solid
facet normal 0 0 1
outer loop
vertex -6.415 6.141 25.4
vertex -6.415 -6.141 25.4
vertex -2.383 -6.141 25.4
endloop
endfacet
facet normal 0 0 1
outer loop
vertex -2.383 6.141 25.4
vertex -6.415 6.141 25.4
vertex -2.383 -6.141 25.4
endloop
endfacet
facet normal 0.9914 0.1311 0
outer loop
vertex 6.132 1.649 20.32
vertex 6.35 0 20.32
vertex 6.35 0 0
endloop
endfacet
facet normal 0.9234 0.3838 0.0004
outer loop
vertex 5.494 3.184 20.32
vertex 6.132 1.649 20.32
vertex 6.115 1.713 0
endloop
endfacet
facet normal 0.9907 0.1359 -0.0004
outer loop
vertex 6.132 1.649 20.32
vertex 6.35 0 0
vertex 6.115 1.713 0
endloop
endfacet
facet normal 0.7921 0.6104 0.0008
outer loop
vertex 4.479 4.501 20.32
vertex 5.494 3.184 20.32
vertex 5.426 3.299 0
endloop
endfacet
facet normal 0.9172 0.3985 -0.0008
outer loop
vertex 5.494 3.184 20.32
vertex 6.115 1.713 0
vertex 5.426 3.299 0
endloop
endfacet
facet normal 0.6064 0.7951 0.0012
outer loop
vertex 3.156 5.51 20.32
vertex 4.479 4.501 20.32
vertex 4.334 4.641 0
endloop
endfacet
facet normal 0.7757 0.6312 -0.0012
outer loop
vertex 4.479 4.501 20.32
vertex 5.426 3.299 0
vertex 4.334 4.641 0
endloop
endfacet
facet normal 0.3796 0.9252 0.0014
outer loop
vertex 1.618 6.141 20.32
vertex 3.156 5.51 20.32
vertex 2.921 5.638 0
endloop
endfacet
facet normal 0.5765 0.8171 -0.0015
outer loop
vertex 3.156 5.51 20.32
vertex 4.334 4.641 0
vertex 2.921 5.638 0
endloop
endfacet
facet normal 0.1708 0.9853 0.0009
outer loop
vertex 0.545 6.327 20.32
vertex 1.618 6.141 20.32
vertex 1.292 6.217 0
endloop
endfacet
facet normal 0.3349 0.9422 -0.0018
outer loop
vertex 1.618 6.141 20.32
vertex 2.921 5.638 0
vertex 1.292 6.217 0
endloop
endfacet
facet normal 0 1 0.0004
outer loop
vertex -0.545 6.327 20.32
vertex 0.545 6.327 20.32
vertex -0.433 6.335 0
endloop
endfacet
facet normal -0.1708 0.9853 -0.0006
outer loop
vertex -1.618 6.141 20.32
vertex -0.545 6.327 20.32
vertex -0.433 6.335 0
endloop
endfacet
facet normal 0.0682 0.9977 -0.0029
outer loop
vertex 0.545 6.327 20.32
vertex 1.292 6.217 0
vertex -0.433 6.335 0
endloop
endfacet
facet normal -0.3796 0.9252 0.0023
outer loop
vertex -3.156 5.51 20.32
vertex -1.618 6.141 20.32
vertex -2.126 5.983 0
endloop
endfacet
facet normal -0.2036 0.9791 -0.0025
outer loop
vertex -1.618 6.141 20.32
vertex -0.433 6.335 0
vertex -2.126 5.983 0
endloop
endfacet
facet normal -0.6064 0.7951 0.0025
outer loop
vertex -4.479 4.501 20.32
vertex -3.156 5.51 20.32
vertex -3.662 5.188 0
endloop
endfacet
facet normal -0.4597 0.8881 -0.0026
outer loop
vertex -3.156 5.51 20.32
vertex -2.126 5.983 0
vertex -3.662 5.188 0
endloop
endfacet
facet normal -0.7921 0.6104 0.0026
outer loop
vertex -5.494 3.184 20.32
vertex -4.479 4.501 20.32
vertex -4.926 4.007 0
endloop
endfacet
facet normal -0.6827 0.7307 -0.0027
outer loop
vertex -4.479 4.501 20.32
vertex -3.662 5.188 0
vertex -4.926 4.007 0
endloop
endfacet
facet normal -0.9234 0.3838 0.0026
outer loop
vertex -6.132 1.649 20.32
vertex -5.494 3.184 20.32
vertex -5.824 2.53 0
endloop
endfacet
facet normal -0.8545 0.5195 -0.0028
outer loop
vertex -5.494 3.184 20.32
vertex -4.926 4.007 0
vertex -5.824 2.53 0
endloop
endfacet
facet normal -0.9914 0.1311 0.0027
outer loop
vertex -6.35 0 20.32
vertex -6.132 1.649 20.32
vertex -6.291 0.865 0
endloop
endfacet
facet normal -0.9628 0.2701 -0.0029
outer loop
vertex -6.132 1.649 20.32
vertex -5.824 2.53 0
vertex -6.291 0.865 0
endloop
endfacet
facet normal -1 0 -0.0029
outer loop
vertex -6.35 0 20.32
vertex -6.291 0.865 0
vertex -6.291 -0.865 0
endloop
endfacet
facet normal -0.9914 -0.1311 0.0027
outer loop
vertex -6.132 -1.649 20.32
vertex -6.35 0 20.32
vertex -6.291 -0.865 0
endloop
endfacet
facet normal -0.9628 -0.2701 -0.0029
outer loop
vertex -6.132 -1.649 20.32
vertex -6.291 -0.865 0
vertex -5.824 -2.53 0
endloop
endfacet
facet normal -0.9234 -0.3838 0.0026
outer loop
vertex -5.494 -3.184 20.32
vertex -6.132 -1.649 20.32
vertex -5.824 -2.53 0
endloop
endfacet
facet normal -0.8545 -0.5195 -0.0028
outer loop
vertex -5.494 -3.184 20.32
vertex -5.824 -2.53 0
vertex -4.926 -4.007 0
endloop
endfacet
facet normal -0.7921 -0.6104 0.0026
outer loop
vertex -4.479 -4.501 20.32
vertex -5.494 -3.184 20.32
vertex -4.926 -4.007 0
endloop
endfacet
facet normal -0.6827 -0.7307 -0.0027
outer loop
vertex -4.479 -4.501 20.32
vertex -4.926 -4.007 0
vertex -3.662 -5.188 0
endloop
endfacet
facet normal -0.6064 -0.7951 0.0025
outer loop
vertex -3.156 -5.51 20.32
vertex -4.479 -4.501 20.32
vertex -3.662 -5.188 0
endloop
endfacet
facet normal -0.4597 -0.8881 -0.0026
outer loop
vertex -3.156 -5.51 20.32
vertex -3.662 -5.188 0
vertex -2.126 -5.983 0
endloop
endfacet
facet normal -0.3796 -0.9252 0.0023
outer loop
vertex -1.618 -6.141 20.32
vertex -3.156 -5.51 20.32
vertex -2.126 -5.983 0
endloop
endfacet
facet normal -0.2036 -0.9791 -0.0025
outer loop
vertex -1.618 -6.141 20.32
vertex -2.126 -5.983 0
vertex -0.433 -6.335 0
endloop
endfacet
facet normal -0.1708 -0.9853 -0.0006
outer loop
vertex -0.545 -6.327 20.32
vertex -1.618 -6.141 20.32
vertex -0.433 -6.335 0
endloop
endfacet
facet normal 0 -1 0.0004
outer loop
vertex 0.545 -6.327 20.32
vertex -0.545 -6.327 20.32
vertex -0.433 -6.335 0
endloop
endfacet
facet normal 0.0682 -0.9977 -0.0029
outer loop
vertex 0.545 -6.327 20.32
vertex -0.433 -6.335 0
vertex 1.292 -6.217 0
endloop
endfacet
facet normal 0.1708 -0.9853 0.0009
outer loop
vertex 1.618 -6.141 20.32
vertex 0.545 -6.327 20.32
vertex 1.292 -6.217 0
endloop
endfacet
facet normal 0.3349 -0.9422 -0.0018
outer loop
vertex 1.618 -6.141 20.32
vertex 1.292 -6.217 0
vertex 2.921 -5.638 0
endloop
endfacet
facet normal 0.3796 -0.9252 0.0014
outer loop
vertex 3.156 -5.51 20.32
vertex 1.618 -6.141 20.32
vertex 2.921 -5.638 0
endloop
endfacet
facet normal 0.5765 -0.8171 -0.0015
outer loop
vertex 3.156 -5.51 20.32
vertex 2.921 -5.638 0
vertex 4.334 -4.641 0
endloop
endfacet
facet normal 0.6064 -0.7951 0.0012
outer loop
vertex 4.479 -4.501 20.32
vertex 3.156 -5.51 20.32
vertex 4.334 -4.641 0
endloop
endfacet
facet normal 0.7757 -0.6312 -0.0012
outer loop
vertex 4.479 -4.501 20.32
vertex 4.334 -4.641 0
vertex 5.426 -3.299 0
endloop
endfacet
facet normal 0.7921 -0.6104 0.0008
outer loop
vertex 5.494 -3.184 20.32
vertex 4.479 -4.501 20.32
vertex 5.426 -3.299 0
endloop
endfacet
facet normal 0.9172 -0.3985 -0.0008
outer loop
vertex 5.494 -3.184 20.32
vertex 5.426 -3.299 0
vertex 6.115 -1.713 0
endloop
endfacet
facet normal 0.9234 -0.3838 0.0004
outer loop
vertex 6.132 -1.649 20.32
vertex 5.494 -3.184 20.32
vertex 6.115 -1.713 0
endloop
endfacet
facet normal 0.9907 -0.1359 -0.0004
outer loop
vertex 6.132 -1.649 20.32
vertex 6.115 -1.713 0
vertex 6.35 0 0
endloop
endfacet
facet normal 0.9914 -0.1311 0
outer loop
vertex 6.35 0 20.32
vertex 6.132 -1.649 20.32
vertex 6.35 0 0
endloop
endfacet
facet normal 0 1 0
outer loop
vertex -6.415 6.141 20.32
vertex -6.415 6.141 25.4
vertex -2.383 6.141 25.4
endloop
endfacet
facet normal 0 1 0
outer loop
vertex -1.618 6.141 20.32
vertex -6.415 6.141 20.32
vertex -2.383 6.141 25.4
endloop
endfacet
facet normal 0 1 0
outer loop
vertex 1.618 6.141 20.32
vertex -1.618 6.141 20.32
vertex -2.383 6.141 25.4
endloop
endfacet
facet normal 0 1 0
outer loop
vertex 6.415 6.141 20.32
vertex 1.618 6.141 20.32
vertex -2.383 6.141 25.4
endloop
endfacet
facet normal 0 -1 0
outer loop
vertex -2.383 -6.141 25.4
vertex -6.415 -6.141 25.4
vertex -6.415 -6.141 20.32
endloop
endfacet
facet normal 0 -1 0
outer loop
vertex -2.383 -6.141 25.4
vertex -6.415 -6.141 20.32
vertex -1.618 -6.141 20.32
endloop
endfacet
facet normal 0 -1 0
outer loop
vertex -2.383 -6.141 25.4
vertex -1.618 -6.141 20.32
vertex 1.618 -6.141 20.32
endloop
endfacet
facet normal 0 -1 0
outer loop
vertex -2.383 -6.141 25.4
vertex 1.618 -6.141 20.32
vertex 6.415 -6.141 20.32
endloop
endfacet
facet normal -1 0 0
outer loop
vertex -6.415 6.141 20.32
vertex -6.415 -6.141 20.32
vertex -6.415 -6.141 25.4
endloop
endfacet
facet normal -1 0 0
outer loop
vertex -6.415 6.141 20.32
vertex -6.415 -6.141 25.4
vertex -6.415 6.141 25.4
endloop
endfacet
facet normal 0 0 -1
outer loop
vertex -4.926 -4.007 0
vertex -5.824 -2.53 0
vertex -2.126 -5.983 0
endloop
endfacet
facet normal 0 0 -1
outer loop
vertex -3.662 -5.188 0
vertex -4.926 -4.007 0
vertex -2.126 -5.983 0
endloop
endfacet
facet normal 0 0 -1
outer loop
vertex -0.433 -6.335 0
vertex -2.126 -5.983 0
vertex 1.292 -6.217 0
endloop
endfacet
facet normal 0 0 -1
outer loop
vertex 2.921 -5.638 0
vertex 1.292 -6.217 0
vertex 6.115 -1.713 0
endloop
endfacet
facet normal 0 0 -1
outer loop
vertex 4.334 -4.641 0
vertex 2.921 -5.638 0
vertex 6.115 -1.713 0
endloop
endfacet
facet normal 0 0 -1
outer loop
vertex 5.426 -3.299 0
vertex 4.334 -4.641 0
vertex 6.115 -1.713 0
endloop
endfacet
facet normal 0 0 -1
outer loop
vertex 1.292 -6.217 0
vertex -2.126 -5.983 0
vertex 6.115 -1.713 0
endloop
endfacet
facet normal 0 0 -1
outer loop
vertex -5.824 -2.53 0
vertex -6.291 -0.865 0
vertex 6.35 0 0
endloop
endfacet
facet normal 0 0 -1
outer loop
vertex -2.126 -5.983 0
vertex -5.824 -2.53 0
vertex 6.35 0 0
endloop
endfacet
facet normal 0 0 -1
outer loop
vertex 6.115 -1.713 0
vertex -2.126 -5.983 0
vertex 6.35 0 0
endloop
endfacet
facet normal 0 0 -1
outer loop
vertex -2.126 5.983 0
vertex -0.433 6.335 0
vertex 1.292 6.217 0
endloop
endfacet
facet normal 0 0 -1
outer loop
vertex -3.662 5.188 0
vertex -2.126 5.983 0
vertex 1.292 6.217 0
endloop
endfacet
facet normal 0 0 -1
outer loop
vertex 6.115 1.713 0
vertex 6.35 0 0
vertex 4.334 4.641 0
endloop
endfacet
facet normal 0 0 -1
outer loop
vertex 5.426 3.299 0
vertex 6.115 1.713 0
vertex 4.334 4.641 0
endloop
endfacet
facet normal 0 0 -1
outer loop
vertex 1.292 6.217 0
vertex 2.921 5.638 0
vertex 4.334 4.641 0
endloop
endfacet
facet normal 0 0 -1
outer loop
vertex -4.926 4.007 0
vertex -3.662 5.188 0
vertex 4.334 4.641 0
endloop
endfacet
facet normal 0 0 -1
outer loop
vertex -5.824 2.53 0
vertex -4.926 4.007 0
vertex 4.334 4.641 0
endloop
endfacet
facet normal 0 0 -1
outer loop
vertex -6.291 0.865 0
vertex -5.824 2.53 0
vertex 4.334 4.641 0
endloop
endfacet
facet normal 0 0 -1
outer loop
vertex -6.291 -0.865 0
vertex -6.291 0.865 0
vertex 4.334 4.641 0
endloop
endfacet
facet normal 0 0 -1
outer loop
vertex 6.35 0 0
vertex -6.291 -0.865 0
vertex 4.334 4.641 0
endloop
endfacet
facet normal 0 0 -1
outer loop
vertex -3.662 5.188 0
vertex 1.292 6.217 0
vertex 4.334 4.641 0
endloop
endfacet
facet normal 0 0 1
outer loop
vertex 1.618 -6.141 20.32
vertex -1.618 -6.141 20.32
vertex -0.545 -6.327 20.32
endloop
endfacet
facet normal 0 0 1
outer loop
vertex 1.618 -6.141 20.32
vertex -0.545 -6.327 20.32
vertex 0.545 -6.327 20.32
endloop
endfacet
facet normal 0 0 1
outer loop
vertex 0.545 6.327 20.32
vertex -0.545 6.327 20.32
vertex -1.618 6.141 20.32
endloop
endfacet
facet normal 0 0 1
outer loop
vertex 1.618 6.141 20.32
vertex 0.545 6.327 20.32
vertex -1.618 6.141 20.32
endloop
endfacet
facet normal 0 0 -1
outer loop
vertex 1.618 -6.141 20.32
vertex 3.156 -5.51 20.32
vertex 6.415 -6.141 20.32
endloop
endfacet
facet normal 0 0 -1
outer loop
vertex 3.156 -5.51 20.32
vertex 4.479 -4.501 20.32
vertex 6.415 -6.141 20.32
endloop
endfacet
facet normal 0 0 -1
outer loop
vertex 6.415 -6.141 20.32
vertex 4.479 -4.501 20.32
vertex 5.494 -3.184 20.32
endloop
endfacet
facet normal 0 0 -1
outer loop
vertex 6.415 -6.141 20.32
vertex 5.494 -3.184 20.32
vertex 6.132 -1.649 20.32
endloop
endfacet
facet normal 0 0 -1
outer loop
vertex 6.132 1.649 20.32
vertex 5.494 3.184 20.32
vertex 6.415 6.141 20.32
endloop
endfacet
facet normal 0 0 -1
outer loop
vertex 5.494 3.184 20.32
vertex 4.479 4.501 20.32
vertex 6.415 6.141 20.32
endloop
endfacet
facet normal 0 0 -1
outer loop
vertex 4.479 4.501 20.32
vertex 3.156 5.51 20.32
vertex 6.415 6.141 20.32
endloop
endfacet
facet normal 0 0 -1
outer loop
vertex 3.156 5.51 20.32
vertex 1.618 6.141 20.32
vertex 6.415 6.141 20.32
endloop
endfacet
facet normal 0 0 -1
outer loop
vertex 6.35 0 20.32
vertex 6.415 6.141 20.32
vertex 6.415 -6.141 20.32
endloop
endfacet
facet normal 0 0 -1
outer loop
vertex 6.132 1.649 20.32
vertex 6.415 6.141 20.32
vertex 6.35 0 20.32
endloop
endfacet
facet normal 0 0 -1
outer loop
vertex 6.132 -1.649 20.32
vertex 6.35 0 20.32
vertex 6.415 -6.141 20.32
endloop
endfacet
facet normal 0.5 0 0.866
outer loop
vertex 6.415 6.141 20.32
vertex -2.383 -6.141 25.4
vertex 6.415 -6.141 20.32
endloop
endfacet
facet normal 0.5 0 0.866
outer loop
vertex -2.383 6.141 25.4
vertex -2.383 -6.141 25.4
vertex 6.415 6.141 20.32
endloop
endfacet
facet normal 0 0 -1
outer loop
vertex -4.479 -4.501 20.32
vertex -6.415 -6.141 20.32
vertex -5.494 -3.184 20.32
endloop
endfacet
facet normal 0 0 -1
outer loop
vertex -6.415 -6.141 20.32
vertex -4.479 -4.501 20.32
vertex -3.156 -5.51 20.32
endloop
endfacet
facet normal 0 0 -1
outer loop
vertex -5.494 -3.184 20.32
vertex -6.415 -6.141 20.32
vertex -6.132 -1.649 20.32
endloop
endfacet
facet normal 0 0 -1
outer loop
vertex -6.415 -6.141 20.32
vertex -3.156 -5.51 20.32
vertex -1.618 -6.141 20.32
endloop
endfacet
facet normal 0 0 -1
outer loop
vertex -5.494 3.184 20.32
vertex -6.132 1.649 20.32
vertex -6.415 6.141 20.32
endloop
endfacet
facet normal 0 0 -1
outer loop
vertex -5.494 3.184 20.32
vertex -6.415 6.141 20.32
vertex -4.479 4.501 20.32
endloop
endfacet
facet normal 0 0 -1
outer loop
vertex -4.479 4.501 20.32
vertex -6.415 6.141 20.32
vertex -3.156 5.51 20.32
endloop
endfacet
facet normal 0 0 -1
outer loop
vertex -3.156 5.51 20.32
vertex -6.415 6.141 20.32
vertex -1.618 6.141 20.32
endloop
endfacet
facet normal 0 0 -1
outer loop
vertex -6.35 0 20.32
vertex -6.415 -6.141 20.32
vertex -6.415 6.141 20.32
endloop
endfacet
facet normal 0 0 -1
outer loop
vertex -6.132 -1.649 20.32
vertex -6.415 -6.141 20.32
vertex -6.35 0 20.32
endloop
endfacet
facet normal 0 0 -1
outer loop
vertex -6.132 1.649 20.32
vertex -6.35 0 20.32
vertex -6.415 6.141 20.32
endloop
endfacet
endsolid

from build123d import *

# Parameters (mm, degrees)
F0_R     = 6.35
F1_DEPTH = 20.32
F2_W     = 12.8309261054
F2_H     = 12.2810313478
F3_DEPTH = 5.08
F4_SIZE2 = 8.798808
F4_SIZE  = 5.07999


# Not quite as in the source:
# - a fillet or chamfer is up to 0.001 mm smaller than in the source, because OpenCascade refuses the exact size


with BuildPart() as f1:
    # F0 (on Top) → F1 (new body)
    with BuildSketch(Plane.XY):
        Circle(F0_R)
    extrude(amount=F1_DEPTH)

    # F2 (on face) → F3 (join)
    with BuildSketch(Plane.XY.offset(20.32)):
        Rectangle(F2_W, F2_H)
    extrude(amount=F3_DEPTH)

    # F4 (size 5.08 and 8.7988181024 in the source; OpenCascade refuses exactly that, so slightly less here)
    f4_edges = [f1.edges().sort_by_distance(p)[0] for p in [
        (6.415463, 0, 25.4),
    ]]
    f4_side = f1.faces().sort_by_distance((6.415463, 0, 22.86))[0]
    chamfer(f4_edges, length=F4_SIZE, length2=F4_SIZE2, reference=f4_side)


solid = f1.part
